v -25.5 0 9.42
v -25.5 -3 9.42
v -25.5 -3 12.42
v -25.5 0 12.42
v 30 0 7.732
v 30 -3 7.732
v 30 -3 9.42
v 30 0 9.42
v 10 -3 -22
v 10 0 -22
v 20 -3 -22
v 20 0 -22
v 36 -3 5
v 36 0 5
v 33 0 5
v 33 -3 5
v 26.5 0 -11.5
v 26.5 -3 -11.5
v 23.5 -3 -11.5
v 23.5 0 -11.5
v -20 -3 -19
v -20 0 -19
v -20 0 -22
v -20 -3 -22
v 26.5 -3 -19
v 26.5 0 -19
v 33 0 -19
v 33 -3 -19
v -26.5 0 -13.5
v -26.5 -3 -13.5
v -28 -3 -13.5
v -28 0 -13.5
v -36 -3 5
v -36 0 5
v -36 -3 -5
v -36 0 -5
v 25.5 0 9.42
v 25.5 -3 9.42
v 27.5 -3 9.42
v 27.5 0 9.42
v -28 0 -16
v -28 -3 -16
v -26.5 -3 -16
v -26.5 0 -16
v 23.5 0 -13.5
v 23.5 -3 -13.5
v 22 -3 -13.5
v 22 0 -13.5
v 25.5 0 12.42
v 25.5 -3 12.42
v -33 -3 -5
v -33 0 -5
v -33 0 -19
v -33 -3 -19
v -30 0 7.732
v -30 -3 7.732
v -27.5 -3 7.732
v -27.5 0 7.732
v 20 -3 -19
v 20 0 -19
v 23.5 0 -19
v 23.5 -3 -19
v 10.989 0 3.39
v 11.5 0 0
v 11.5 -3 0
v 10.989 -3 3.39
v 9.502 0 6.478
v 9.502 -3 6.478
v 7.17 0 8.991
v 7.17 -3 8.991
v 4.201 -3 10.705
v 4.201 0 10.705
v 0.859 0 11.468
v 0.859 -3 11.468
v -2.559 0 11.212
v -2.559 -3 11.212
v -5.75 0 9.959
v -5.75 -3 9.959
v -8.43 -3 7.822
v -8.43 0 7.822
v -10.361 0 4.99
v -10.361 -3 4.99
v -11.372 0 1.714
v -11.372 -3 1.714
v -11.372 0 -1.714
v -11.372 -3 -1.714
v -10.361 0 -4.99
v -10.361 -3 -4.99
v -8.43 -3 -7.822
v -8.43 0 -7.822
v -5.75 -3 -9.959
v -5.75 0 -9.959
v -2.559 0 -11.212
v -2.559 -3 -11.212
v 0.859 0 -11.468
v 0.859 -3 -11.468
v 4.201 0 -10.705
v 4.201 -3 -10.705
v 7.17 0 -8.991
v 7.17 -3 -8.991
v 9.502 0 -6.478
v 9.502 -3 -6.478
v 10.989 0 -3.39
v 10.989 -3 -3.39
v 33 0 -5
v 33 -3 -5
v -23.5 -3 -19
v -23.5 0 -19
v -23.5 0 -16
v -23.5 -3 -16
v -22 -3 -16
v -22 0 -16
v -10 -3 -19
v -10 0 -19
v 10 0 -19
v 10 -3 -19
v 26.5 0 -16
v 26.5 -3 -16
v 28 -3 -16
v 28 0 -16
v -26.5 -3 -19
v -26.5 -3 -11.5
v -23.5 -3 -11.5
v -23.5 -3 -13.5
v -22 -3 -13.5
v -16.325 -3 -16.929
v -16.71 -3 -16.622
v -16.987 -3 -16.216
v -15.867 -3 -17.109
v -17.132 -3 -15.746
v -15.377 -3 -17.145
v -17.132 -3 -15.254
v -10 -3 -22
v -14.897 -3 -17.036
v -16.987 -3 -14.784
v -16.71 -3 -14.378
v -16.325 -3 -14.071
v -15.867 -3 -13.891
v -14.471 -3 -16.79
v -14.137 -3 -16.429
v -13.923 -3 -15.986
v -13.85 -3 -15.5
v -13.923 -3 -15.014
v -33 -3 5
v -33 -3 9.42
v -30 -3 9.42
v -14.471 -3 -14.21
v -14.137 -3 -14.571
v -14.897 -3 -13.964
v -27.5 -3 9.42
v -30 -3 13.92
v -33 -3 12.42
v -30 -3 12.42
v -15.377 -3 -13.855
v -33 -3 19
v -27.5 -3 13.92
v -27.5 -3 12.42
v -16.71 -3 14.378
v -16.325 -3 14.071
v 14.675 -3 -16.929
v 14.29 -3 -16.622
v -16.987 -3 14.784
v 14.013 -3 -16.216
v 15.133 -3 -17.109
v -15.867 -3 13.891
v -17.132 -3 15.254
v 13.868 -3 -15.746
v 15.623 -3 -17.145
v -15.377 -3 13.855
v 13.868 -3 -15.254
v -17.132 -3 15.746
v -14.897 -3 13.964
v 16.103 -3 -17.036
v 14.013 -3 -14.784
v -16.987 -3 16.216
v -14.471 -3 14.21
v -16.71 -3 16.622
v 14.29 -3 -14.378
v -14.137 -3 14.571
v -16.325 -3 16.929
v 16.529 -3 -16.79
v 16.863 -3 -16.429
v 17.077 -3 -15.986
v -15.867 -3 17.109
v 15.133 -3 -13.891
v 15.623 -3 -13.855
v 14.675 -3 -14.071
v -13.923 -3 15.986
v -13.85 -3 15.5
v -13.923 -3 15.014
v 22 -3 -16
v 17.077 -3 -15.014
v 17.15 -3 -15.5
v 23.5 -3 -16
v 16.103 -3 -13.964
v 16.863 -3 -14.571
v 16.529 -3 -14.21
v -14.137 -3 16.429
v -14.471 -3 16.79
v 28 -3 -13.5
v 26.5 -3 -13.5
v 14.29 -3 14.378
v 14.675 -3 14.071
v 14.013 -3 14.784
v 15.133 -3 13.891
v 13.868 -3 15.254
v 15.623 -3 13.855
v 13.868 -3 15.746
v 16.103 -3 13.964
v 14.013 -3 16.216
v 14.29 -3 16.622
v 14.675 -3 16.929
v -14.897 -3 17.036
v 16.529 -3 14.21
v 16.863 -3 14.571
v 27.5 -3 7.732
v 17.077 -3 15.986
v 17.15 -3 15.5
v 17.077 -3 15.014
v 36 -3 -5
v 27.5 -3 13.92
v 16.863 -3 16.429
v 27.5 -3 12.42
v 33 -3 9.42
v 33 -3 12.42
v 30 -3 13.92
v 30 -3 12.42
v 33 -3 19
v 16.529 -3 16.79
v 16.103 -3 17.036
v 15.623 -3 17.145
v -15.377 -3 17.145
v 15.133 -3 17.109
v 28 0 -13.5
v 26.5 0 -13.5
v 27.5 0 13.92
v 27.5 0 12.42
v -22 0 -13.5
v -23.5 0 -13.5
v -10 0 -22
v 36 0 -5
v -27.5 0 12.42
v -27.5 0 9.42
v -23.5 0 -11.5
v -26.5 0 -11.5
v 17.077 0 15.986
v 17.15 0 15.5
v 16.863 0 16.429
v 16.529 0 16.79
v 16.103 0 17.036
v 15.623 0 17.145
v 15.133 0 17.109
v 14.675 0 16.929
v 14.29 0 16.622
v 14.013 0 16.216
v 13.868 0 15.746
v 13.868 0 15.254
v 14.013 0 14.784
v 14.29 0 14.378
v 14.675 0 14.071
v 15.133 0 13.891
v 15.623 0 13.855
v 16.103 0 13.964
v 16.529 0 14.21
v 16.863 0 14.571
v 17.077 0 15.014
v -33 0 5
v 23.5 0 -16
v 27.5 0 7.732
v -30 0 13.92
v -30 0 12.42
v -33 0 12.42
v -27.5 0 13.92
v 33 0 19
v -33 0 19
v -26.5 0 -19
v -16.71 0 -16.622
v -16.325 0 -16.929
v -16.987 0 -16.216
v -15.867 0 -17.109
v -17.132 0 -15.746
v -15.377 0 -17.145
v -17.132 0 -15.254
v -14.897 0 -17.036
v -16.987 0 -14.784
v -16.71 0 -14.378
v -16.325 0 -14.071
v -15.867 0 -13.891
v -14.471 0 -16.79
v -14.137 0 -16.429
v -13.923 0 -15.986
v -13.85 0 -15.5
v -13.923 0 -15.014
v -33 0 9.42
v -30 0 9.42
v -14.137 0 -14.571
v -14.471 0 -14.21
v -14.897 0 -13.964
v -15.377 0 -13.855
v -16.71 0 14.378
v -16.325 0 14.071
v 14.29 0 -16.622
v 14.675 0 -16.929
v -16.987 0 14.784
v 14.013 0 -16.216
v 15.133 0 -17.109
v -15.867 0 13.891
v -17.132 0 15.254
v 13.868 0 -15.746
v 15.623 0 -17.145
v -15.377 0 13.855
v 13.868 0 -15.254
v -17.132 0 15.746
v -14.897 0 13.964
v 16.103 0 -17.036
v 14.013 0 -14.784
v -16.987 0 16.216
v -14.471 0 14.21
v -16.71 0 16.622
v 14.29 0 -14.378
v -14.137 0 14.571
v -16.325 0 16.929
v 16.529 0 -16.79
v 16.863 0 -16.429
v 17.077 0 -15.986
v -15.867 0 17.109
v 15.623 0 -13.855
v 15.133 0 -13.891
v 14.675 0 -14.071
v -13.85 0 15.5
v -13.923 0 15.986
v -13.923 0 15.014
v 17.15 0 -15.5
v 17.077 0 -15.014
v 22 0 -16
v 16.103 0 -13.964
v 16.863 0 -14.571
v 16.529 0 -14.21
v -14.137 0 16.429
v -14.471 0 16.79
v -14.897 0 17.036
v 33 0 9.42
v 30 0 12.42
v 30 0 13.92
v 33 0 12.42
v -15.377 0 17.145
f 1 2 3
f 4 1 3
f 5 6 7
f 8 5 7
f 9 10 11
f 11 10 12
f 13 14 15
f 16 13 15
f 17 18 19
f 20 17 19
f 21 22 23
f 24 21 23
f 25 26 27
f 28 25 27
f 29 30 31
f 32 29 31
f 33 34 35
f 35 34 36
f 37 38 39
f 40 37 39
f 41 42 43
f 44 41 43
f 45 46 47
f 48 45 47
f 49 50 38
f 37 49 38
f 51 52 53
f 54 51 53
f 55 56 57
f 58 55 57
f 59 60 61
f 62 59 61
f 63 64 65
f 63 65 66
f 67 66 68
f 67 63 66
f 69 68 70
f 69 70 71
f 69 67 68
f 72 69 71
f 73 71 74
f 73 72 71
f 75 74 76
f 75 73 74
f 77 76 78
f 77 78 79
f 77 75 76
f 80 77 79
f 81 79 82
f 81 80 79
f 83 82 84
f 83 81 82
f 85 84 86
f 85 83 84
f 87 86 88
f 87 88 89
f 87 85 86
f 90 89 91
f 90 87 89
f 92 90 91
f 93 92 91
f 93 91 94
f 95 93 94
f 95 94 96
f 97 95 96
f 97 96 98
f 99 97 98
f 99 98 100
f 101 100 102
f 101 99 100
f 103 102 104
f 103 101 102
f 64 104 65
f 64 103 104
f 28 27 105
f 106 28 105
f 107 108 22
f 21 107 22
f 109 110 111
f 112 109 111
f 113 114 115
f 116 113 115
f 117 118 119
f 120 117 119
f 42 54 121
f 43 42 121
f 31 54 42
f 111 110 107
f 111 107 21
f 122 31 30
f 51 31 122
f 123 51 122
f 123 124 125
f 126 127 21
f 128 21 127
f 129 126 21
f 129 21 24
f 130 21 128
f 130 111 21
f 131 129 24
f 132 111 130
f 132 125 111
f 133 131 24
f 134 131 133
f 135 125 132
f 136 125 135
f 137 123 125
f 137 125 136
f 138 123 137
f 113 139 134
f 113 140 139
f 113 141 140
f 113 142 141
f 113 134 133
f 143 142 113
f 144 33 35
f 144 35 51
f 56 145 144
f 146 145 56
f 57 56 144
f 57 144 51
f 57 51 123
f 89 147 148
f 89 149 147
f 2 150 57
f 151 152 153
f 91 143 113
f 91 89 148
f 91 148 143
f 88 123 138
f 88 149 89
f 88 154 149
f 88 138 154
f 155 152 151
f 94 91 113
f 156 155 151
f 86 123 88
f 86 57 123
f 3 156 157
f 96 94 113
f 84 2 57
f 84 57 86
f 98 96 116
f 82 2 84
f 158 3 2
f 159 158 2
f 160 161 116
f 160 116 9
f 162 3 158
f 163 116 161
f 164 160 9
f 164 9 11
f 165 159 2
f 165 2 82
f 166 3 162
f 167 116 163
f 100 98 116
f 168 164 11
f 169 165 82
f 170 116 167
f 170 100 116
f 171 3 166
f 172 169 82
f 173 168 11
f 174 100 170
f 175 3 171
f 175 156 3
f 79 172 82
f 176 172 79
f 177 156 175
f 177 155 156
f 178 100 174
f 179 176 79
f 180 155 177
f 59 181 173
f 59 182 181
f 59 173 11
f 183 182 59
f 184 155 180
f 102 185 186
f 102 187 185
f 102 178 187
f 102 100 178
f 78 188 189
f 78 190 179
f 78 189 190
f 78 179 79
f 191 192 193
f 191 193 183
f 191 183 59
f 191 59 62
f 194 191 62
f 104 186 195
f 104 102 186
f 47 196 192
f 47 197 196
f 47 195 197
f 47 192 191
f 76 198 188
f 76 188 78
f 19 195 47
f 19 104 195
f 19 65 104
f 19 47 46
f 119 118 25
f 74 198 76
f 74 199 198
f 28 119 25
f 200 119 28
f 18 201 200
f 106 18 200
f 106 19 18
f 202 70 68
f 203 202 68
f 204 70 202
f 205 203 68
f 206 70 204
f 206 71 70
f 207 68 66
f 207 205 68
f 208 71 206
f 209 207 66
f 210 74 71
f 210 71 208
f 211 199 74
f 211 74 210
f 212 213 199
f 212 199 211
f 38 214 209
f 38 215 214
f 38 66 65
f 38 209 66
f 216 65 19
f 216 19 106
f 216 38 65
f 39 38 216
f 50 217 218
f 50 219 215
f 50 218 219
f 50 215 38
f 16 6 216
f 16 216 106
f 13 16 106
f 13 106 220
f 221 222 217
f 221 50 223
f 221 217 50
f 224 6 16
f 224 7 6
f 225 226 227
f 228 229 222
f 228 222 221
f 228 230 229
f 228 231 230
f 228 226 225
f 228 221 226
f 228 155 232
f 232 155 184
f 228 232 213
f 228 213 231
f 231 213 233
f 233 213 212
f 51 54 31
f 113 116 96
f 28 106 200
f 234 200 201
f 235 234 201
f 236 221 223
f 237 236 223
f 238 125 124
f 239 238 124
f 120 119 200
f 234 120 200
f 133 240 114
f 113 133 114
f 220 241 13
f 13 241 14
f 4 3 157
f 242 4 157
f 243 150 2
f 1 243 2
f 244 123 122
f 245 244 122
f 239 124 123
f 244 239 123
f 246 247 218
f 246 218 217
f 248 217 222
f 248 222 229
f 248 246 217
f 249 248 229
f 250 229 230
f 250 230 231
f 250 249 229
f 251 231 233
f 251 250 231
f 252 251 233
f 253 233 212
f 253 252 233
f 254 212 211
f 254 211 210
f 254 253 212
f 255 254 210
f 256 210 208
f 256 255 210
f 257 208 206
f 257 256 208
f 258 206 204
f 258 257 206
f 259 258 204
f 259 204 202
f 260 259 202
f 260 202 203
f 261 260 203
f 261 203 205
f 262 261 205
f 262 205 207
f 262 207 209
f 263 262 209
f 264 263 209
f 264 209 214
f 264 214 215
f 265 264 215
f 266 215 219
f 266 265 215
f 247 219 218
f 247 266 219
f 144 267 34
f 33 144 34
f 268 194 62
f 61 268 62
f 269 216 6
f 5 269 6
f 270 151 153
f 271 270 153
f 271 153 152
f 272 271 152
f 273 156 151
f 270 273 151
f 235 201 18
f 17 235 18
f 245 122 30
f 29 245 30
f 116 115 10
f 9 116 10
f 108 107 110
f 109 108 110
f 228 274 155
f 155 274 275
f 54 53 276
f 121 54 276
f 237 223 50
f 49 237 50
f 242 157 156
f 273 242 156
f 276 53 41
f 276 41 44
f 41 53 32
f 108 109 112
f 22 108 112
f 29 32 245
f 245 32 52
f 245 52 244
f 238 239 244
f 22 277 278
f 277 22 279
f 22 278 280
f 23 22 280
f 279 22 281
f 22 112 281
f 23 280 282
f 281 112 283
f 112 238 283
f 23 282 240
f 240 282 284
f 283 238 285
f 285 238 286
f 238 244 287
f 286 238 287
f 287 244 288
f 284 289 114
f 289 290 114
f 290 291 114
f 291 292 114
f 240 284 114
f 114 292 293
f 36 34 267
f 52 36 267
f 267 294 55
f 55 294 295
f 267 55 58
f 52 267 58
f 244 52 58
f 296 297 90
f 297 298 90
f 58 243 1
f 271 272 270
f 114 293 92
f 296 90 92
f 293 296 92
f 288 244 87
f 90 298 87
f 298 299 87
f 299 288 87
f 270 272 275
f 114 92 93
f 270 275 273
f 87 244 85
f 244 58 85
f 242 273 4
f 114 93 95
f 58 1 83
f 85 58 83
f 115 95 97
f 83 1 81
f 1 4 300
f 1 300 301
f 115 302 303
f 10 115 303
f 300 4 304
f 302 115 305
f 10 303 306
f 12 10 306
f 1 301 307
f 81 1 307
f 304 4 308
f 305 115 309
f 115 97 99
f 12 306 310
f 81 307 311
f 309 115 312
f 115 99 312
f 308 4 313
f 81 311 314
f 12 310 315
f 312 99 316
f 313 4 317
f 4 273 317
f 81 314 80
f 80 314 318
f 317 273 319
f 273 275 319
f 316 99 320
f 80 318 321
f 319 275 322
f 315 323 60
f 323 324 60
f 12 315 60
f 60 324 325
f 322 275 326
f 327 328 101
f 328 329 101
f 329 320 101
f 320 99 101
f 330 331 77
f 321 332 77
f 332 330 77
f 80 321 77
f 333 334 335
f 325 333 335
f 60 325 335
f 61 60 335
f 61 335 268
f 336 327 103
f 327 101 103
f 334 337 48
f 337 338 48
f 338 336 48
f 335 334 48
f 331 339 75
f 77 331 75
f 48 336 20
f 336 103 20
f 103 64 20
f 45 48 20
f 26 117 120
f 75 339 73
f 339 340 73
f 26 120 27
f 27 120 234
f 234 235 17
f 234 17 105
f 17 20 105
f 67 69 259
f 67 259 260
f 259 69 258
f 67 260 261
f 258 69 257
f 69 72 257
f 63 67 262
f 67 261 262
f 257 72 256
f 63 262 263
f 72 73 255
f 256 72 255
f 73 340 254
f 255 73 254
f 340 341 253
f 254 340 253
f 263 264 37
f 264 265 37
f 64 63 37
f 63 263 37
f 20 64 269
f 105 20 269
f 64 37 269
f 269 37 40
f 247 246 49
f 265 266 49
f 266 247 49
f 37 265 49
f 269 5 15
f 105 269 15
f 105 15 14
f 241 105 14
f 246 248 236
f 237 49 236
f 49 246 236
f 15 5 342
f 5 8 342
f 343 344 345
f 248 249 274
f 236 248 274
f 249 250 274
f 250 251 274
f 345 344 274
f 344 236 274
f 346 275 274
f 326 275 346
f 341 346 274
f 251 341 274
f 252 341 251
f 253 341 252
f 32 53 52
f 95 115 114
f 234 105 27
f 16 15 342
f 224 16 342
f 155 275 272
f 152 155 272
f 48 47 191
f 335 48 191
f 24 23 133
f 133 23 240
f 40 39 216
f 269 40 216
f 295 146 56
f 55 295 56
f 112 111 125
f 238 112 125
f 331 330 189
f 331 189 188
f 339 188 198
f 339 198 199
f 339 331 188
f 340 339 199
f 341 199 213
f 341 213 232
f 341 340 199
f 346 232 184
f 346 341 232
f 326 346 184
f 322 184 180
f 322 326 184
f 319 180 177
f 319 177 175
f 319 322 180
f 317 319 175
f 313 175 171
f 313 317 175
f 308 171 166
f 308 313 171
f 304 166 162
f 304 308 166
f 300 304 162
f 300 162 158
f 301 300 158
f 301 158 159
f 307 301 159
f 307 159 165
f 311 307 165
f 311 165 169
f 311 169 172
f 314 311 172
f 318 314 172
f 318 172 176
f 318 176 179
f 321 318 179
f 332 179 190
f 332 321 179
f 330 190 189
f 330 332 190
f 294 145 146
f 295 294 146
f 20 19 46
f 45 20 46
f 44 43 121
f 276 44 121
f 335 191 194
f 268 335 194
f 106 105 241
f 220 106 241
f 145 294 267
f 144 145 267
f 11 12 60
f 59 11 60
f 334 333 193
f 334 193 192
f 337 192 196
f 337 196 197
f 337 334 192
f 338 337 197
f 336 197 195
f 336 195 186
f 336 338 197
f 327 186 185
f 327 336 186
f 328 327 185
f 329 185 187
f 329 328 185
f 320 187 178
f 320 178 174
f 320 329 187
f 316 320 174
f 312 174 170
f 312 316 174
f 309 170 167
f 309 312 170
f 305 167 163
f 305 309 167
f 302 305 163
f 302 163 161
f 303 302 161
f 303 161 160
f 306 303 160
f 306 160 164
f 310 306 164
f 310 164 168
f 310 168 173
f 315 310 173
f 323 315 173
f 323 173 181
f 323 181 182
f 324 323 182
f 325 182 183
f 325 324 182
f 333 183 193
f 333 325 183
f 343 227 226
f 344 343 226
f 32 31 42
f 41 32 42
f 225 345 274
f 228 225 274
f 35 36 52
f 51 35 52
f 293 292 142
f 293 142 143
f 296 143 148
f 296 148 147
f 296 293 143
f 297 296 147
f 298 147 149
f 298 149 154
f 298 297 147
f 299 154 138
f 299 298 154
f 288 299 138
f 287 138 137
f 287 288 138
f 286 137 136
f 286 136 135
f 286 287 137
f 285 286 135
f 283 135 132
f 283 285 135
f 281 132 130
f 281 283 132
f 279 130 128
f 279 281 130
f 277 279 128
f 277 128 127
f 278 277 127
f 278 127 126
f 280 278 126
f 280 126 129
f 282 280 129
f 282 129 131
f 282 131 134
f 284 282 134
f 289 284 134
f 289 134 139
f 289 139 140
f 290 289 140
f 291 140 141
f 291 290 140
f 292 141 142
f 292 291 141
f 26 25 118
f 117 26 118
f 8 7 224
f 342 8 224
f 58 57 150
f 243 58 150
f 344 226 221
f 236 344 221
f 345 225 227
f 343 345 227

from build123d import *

# Parameters (mm, degrees)
F0_R     = 1.65
F0_R_2   = 11.5
F1_DEPTH = 3
F3_DEPTH = 3


# Not quite as in the source:
# - a feature names something its author has since deleted; it is built from what else it names


with BuildPart() as f1:
    # F0 (on Front) → F1 (new body)
    with BuildSketch(Plane.XZ):
        Polygon((33, 5), (33, 19), (-33, 19), (-33, 5), (-36, 5), (-36, -5), (-33, -5), (-33, -19), (-20, -19), (-20, -22), (-10, -22), (-10, -19), (0, -19), (10, -19), (10, -22), (20, -22), (20, -19), (33, -19), (33, -5), (36, -5), (36, 5), align=None)
        with Locations((-15.5, -15.5)):
            Circle(F0_R, mode=Mode.SUBTRACT)
        with Locations((15.5, -15.5)):
            Circle(F0_R, mode=Mode.SUBTRACT)
        with Locations((-15.5, 15.5)):
            Circle(F0_R, mode=Mode.SUBTRACT)
        Circle(F0_R_2, mode=Mode.SUBTRACT)
        with Locations((15.5, 15.5)):
            Circle(F0_R, mode=Mode.SUBTRACT)
    extrude(amount=F1_DEPTH)

    # F2 (on face) → F3 (cut, through all)
    with BuildSketch(Plane.XZ.offset(3)):
        Polygon((23.5, -16), (23.5, -19), (26.5, -19), (26.5, -16), (28, -16), (28, -13.5), (26.5, -13.5), (26.5, -11.5), (23.5, -11.5), (23.5, -13.5), (22, -13.5), (22, -16), align=None)
        Polygon((-26.5, -19), (-23.5, -19), (-23.5, -16), (-22, -16), (-22, -13.5), (-23.5, -13.5), (-23.5, -11.5), (-26.5, -11.5), (-26.5, -13.5), (-28, -13.5), (-28, -16), (-26.5, -16), align=None)
        Polygon((30, 9.4201220199), (33, 9.4201220199), (33, 11), (33, 12.4201220199), (30, 12.4201220199), (30, 13.9201220199), (27.5, 13.9201220199), (27.5, 12.4201220199), (25.5, 12.4201220199), (25.5, 9.4201220199), (27.5, 9.4201220199), (27.5, 7.7319853008), (30, 7.7319853008), align=None)
        Polygon((-30, 12.4201220199), (-33, 12.4201220199), (-33, 11), (-33, 9.4201220199), (-30, 9.4201220199), (-30, 7.7319853008), (-27.5, 7.7319853008), (-27.5, 9.4201220199), (-25.5, 9.4201220199), (-25.5, 12.4201220199), (-27.5, 12.4201220199), (-27.5, 13.9201220199), (-30, 13.9201220199), align=None)
    extrude(amount=-F3_DEPTH, mode=Mode.SUBTRACT)


solid = f1.part
